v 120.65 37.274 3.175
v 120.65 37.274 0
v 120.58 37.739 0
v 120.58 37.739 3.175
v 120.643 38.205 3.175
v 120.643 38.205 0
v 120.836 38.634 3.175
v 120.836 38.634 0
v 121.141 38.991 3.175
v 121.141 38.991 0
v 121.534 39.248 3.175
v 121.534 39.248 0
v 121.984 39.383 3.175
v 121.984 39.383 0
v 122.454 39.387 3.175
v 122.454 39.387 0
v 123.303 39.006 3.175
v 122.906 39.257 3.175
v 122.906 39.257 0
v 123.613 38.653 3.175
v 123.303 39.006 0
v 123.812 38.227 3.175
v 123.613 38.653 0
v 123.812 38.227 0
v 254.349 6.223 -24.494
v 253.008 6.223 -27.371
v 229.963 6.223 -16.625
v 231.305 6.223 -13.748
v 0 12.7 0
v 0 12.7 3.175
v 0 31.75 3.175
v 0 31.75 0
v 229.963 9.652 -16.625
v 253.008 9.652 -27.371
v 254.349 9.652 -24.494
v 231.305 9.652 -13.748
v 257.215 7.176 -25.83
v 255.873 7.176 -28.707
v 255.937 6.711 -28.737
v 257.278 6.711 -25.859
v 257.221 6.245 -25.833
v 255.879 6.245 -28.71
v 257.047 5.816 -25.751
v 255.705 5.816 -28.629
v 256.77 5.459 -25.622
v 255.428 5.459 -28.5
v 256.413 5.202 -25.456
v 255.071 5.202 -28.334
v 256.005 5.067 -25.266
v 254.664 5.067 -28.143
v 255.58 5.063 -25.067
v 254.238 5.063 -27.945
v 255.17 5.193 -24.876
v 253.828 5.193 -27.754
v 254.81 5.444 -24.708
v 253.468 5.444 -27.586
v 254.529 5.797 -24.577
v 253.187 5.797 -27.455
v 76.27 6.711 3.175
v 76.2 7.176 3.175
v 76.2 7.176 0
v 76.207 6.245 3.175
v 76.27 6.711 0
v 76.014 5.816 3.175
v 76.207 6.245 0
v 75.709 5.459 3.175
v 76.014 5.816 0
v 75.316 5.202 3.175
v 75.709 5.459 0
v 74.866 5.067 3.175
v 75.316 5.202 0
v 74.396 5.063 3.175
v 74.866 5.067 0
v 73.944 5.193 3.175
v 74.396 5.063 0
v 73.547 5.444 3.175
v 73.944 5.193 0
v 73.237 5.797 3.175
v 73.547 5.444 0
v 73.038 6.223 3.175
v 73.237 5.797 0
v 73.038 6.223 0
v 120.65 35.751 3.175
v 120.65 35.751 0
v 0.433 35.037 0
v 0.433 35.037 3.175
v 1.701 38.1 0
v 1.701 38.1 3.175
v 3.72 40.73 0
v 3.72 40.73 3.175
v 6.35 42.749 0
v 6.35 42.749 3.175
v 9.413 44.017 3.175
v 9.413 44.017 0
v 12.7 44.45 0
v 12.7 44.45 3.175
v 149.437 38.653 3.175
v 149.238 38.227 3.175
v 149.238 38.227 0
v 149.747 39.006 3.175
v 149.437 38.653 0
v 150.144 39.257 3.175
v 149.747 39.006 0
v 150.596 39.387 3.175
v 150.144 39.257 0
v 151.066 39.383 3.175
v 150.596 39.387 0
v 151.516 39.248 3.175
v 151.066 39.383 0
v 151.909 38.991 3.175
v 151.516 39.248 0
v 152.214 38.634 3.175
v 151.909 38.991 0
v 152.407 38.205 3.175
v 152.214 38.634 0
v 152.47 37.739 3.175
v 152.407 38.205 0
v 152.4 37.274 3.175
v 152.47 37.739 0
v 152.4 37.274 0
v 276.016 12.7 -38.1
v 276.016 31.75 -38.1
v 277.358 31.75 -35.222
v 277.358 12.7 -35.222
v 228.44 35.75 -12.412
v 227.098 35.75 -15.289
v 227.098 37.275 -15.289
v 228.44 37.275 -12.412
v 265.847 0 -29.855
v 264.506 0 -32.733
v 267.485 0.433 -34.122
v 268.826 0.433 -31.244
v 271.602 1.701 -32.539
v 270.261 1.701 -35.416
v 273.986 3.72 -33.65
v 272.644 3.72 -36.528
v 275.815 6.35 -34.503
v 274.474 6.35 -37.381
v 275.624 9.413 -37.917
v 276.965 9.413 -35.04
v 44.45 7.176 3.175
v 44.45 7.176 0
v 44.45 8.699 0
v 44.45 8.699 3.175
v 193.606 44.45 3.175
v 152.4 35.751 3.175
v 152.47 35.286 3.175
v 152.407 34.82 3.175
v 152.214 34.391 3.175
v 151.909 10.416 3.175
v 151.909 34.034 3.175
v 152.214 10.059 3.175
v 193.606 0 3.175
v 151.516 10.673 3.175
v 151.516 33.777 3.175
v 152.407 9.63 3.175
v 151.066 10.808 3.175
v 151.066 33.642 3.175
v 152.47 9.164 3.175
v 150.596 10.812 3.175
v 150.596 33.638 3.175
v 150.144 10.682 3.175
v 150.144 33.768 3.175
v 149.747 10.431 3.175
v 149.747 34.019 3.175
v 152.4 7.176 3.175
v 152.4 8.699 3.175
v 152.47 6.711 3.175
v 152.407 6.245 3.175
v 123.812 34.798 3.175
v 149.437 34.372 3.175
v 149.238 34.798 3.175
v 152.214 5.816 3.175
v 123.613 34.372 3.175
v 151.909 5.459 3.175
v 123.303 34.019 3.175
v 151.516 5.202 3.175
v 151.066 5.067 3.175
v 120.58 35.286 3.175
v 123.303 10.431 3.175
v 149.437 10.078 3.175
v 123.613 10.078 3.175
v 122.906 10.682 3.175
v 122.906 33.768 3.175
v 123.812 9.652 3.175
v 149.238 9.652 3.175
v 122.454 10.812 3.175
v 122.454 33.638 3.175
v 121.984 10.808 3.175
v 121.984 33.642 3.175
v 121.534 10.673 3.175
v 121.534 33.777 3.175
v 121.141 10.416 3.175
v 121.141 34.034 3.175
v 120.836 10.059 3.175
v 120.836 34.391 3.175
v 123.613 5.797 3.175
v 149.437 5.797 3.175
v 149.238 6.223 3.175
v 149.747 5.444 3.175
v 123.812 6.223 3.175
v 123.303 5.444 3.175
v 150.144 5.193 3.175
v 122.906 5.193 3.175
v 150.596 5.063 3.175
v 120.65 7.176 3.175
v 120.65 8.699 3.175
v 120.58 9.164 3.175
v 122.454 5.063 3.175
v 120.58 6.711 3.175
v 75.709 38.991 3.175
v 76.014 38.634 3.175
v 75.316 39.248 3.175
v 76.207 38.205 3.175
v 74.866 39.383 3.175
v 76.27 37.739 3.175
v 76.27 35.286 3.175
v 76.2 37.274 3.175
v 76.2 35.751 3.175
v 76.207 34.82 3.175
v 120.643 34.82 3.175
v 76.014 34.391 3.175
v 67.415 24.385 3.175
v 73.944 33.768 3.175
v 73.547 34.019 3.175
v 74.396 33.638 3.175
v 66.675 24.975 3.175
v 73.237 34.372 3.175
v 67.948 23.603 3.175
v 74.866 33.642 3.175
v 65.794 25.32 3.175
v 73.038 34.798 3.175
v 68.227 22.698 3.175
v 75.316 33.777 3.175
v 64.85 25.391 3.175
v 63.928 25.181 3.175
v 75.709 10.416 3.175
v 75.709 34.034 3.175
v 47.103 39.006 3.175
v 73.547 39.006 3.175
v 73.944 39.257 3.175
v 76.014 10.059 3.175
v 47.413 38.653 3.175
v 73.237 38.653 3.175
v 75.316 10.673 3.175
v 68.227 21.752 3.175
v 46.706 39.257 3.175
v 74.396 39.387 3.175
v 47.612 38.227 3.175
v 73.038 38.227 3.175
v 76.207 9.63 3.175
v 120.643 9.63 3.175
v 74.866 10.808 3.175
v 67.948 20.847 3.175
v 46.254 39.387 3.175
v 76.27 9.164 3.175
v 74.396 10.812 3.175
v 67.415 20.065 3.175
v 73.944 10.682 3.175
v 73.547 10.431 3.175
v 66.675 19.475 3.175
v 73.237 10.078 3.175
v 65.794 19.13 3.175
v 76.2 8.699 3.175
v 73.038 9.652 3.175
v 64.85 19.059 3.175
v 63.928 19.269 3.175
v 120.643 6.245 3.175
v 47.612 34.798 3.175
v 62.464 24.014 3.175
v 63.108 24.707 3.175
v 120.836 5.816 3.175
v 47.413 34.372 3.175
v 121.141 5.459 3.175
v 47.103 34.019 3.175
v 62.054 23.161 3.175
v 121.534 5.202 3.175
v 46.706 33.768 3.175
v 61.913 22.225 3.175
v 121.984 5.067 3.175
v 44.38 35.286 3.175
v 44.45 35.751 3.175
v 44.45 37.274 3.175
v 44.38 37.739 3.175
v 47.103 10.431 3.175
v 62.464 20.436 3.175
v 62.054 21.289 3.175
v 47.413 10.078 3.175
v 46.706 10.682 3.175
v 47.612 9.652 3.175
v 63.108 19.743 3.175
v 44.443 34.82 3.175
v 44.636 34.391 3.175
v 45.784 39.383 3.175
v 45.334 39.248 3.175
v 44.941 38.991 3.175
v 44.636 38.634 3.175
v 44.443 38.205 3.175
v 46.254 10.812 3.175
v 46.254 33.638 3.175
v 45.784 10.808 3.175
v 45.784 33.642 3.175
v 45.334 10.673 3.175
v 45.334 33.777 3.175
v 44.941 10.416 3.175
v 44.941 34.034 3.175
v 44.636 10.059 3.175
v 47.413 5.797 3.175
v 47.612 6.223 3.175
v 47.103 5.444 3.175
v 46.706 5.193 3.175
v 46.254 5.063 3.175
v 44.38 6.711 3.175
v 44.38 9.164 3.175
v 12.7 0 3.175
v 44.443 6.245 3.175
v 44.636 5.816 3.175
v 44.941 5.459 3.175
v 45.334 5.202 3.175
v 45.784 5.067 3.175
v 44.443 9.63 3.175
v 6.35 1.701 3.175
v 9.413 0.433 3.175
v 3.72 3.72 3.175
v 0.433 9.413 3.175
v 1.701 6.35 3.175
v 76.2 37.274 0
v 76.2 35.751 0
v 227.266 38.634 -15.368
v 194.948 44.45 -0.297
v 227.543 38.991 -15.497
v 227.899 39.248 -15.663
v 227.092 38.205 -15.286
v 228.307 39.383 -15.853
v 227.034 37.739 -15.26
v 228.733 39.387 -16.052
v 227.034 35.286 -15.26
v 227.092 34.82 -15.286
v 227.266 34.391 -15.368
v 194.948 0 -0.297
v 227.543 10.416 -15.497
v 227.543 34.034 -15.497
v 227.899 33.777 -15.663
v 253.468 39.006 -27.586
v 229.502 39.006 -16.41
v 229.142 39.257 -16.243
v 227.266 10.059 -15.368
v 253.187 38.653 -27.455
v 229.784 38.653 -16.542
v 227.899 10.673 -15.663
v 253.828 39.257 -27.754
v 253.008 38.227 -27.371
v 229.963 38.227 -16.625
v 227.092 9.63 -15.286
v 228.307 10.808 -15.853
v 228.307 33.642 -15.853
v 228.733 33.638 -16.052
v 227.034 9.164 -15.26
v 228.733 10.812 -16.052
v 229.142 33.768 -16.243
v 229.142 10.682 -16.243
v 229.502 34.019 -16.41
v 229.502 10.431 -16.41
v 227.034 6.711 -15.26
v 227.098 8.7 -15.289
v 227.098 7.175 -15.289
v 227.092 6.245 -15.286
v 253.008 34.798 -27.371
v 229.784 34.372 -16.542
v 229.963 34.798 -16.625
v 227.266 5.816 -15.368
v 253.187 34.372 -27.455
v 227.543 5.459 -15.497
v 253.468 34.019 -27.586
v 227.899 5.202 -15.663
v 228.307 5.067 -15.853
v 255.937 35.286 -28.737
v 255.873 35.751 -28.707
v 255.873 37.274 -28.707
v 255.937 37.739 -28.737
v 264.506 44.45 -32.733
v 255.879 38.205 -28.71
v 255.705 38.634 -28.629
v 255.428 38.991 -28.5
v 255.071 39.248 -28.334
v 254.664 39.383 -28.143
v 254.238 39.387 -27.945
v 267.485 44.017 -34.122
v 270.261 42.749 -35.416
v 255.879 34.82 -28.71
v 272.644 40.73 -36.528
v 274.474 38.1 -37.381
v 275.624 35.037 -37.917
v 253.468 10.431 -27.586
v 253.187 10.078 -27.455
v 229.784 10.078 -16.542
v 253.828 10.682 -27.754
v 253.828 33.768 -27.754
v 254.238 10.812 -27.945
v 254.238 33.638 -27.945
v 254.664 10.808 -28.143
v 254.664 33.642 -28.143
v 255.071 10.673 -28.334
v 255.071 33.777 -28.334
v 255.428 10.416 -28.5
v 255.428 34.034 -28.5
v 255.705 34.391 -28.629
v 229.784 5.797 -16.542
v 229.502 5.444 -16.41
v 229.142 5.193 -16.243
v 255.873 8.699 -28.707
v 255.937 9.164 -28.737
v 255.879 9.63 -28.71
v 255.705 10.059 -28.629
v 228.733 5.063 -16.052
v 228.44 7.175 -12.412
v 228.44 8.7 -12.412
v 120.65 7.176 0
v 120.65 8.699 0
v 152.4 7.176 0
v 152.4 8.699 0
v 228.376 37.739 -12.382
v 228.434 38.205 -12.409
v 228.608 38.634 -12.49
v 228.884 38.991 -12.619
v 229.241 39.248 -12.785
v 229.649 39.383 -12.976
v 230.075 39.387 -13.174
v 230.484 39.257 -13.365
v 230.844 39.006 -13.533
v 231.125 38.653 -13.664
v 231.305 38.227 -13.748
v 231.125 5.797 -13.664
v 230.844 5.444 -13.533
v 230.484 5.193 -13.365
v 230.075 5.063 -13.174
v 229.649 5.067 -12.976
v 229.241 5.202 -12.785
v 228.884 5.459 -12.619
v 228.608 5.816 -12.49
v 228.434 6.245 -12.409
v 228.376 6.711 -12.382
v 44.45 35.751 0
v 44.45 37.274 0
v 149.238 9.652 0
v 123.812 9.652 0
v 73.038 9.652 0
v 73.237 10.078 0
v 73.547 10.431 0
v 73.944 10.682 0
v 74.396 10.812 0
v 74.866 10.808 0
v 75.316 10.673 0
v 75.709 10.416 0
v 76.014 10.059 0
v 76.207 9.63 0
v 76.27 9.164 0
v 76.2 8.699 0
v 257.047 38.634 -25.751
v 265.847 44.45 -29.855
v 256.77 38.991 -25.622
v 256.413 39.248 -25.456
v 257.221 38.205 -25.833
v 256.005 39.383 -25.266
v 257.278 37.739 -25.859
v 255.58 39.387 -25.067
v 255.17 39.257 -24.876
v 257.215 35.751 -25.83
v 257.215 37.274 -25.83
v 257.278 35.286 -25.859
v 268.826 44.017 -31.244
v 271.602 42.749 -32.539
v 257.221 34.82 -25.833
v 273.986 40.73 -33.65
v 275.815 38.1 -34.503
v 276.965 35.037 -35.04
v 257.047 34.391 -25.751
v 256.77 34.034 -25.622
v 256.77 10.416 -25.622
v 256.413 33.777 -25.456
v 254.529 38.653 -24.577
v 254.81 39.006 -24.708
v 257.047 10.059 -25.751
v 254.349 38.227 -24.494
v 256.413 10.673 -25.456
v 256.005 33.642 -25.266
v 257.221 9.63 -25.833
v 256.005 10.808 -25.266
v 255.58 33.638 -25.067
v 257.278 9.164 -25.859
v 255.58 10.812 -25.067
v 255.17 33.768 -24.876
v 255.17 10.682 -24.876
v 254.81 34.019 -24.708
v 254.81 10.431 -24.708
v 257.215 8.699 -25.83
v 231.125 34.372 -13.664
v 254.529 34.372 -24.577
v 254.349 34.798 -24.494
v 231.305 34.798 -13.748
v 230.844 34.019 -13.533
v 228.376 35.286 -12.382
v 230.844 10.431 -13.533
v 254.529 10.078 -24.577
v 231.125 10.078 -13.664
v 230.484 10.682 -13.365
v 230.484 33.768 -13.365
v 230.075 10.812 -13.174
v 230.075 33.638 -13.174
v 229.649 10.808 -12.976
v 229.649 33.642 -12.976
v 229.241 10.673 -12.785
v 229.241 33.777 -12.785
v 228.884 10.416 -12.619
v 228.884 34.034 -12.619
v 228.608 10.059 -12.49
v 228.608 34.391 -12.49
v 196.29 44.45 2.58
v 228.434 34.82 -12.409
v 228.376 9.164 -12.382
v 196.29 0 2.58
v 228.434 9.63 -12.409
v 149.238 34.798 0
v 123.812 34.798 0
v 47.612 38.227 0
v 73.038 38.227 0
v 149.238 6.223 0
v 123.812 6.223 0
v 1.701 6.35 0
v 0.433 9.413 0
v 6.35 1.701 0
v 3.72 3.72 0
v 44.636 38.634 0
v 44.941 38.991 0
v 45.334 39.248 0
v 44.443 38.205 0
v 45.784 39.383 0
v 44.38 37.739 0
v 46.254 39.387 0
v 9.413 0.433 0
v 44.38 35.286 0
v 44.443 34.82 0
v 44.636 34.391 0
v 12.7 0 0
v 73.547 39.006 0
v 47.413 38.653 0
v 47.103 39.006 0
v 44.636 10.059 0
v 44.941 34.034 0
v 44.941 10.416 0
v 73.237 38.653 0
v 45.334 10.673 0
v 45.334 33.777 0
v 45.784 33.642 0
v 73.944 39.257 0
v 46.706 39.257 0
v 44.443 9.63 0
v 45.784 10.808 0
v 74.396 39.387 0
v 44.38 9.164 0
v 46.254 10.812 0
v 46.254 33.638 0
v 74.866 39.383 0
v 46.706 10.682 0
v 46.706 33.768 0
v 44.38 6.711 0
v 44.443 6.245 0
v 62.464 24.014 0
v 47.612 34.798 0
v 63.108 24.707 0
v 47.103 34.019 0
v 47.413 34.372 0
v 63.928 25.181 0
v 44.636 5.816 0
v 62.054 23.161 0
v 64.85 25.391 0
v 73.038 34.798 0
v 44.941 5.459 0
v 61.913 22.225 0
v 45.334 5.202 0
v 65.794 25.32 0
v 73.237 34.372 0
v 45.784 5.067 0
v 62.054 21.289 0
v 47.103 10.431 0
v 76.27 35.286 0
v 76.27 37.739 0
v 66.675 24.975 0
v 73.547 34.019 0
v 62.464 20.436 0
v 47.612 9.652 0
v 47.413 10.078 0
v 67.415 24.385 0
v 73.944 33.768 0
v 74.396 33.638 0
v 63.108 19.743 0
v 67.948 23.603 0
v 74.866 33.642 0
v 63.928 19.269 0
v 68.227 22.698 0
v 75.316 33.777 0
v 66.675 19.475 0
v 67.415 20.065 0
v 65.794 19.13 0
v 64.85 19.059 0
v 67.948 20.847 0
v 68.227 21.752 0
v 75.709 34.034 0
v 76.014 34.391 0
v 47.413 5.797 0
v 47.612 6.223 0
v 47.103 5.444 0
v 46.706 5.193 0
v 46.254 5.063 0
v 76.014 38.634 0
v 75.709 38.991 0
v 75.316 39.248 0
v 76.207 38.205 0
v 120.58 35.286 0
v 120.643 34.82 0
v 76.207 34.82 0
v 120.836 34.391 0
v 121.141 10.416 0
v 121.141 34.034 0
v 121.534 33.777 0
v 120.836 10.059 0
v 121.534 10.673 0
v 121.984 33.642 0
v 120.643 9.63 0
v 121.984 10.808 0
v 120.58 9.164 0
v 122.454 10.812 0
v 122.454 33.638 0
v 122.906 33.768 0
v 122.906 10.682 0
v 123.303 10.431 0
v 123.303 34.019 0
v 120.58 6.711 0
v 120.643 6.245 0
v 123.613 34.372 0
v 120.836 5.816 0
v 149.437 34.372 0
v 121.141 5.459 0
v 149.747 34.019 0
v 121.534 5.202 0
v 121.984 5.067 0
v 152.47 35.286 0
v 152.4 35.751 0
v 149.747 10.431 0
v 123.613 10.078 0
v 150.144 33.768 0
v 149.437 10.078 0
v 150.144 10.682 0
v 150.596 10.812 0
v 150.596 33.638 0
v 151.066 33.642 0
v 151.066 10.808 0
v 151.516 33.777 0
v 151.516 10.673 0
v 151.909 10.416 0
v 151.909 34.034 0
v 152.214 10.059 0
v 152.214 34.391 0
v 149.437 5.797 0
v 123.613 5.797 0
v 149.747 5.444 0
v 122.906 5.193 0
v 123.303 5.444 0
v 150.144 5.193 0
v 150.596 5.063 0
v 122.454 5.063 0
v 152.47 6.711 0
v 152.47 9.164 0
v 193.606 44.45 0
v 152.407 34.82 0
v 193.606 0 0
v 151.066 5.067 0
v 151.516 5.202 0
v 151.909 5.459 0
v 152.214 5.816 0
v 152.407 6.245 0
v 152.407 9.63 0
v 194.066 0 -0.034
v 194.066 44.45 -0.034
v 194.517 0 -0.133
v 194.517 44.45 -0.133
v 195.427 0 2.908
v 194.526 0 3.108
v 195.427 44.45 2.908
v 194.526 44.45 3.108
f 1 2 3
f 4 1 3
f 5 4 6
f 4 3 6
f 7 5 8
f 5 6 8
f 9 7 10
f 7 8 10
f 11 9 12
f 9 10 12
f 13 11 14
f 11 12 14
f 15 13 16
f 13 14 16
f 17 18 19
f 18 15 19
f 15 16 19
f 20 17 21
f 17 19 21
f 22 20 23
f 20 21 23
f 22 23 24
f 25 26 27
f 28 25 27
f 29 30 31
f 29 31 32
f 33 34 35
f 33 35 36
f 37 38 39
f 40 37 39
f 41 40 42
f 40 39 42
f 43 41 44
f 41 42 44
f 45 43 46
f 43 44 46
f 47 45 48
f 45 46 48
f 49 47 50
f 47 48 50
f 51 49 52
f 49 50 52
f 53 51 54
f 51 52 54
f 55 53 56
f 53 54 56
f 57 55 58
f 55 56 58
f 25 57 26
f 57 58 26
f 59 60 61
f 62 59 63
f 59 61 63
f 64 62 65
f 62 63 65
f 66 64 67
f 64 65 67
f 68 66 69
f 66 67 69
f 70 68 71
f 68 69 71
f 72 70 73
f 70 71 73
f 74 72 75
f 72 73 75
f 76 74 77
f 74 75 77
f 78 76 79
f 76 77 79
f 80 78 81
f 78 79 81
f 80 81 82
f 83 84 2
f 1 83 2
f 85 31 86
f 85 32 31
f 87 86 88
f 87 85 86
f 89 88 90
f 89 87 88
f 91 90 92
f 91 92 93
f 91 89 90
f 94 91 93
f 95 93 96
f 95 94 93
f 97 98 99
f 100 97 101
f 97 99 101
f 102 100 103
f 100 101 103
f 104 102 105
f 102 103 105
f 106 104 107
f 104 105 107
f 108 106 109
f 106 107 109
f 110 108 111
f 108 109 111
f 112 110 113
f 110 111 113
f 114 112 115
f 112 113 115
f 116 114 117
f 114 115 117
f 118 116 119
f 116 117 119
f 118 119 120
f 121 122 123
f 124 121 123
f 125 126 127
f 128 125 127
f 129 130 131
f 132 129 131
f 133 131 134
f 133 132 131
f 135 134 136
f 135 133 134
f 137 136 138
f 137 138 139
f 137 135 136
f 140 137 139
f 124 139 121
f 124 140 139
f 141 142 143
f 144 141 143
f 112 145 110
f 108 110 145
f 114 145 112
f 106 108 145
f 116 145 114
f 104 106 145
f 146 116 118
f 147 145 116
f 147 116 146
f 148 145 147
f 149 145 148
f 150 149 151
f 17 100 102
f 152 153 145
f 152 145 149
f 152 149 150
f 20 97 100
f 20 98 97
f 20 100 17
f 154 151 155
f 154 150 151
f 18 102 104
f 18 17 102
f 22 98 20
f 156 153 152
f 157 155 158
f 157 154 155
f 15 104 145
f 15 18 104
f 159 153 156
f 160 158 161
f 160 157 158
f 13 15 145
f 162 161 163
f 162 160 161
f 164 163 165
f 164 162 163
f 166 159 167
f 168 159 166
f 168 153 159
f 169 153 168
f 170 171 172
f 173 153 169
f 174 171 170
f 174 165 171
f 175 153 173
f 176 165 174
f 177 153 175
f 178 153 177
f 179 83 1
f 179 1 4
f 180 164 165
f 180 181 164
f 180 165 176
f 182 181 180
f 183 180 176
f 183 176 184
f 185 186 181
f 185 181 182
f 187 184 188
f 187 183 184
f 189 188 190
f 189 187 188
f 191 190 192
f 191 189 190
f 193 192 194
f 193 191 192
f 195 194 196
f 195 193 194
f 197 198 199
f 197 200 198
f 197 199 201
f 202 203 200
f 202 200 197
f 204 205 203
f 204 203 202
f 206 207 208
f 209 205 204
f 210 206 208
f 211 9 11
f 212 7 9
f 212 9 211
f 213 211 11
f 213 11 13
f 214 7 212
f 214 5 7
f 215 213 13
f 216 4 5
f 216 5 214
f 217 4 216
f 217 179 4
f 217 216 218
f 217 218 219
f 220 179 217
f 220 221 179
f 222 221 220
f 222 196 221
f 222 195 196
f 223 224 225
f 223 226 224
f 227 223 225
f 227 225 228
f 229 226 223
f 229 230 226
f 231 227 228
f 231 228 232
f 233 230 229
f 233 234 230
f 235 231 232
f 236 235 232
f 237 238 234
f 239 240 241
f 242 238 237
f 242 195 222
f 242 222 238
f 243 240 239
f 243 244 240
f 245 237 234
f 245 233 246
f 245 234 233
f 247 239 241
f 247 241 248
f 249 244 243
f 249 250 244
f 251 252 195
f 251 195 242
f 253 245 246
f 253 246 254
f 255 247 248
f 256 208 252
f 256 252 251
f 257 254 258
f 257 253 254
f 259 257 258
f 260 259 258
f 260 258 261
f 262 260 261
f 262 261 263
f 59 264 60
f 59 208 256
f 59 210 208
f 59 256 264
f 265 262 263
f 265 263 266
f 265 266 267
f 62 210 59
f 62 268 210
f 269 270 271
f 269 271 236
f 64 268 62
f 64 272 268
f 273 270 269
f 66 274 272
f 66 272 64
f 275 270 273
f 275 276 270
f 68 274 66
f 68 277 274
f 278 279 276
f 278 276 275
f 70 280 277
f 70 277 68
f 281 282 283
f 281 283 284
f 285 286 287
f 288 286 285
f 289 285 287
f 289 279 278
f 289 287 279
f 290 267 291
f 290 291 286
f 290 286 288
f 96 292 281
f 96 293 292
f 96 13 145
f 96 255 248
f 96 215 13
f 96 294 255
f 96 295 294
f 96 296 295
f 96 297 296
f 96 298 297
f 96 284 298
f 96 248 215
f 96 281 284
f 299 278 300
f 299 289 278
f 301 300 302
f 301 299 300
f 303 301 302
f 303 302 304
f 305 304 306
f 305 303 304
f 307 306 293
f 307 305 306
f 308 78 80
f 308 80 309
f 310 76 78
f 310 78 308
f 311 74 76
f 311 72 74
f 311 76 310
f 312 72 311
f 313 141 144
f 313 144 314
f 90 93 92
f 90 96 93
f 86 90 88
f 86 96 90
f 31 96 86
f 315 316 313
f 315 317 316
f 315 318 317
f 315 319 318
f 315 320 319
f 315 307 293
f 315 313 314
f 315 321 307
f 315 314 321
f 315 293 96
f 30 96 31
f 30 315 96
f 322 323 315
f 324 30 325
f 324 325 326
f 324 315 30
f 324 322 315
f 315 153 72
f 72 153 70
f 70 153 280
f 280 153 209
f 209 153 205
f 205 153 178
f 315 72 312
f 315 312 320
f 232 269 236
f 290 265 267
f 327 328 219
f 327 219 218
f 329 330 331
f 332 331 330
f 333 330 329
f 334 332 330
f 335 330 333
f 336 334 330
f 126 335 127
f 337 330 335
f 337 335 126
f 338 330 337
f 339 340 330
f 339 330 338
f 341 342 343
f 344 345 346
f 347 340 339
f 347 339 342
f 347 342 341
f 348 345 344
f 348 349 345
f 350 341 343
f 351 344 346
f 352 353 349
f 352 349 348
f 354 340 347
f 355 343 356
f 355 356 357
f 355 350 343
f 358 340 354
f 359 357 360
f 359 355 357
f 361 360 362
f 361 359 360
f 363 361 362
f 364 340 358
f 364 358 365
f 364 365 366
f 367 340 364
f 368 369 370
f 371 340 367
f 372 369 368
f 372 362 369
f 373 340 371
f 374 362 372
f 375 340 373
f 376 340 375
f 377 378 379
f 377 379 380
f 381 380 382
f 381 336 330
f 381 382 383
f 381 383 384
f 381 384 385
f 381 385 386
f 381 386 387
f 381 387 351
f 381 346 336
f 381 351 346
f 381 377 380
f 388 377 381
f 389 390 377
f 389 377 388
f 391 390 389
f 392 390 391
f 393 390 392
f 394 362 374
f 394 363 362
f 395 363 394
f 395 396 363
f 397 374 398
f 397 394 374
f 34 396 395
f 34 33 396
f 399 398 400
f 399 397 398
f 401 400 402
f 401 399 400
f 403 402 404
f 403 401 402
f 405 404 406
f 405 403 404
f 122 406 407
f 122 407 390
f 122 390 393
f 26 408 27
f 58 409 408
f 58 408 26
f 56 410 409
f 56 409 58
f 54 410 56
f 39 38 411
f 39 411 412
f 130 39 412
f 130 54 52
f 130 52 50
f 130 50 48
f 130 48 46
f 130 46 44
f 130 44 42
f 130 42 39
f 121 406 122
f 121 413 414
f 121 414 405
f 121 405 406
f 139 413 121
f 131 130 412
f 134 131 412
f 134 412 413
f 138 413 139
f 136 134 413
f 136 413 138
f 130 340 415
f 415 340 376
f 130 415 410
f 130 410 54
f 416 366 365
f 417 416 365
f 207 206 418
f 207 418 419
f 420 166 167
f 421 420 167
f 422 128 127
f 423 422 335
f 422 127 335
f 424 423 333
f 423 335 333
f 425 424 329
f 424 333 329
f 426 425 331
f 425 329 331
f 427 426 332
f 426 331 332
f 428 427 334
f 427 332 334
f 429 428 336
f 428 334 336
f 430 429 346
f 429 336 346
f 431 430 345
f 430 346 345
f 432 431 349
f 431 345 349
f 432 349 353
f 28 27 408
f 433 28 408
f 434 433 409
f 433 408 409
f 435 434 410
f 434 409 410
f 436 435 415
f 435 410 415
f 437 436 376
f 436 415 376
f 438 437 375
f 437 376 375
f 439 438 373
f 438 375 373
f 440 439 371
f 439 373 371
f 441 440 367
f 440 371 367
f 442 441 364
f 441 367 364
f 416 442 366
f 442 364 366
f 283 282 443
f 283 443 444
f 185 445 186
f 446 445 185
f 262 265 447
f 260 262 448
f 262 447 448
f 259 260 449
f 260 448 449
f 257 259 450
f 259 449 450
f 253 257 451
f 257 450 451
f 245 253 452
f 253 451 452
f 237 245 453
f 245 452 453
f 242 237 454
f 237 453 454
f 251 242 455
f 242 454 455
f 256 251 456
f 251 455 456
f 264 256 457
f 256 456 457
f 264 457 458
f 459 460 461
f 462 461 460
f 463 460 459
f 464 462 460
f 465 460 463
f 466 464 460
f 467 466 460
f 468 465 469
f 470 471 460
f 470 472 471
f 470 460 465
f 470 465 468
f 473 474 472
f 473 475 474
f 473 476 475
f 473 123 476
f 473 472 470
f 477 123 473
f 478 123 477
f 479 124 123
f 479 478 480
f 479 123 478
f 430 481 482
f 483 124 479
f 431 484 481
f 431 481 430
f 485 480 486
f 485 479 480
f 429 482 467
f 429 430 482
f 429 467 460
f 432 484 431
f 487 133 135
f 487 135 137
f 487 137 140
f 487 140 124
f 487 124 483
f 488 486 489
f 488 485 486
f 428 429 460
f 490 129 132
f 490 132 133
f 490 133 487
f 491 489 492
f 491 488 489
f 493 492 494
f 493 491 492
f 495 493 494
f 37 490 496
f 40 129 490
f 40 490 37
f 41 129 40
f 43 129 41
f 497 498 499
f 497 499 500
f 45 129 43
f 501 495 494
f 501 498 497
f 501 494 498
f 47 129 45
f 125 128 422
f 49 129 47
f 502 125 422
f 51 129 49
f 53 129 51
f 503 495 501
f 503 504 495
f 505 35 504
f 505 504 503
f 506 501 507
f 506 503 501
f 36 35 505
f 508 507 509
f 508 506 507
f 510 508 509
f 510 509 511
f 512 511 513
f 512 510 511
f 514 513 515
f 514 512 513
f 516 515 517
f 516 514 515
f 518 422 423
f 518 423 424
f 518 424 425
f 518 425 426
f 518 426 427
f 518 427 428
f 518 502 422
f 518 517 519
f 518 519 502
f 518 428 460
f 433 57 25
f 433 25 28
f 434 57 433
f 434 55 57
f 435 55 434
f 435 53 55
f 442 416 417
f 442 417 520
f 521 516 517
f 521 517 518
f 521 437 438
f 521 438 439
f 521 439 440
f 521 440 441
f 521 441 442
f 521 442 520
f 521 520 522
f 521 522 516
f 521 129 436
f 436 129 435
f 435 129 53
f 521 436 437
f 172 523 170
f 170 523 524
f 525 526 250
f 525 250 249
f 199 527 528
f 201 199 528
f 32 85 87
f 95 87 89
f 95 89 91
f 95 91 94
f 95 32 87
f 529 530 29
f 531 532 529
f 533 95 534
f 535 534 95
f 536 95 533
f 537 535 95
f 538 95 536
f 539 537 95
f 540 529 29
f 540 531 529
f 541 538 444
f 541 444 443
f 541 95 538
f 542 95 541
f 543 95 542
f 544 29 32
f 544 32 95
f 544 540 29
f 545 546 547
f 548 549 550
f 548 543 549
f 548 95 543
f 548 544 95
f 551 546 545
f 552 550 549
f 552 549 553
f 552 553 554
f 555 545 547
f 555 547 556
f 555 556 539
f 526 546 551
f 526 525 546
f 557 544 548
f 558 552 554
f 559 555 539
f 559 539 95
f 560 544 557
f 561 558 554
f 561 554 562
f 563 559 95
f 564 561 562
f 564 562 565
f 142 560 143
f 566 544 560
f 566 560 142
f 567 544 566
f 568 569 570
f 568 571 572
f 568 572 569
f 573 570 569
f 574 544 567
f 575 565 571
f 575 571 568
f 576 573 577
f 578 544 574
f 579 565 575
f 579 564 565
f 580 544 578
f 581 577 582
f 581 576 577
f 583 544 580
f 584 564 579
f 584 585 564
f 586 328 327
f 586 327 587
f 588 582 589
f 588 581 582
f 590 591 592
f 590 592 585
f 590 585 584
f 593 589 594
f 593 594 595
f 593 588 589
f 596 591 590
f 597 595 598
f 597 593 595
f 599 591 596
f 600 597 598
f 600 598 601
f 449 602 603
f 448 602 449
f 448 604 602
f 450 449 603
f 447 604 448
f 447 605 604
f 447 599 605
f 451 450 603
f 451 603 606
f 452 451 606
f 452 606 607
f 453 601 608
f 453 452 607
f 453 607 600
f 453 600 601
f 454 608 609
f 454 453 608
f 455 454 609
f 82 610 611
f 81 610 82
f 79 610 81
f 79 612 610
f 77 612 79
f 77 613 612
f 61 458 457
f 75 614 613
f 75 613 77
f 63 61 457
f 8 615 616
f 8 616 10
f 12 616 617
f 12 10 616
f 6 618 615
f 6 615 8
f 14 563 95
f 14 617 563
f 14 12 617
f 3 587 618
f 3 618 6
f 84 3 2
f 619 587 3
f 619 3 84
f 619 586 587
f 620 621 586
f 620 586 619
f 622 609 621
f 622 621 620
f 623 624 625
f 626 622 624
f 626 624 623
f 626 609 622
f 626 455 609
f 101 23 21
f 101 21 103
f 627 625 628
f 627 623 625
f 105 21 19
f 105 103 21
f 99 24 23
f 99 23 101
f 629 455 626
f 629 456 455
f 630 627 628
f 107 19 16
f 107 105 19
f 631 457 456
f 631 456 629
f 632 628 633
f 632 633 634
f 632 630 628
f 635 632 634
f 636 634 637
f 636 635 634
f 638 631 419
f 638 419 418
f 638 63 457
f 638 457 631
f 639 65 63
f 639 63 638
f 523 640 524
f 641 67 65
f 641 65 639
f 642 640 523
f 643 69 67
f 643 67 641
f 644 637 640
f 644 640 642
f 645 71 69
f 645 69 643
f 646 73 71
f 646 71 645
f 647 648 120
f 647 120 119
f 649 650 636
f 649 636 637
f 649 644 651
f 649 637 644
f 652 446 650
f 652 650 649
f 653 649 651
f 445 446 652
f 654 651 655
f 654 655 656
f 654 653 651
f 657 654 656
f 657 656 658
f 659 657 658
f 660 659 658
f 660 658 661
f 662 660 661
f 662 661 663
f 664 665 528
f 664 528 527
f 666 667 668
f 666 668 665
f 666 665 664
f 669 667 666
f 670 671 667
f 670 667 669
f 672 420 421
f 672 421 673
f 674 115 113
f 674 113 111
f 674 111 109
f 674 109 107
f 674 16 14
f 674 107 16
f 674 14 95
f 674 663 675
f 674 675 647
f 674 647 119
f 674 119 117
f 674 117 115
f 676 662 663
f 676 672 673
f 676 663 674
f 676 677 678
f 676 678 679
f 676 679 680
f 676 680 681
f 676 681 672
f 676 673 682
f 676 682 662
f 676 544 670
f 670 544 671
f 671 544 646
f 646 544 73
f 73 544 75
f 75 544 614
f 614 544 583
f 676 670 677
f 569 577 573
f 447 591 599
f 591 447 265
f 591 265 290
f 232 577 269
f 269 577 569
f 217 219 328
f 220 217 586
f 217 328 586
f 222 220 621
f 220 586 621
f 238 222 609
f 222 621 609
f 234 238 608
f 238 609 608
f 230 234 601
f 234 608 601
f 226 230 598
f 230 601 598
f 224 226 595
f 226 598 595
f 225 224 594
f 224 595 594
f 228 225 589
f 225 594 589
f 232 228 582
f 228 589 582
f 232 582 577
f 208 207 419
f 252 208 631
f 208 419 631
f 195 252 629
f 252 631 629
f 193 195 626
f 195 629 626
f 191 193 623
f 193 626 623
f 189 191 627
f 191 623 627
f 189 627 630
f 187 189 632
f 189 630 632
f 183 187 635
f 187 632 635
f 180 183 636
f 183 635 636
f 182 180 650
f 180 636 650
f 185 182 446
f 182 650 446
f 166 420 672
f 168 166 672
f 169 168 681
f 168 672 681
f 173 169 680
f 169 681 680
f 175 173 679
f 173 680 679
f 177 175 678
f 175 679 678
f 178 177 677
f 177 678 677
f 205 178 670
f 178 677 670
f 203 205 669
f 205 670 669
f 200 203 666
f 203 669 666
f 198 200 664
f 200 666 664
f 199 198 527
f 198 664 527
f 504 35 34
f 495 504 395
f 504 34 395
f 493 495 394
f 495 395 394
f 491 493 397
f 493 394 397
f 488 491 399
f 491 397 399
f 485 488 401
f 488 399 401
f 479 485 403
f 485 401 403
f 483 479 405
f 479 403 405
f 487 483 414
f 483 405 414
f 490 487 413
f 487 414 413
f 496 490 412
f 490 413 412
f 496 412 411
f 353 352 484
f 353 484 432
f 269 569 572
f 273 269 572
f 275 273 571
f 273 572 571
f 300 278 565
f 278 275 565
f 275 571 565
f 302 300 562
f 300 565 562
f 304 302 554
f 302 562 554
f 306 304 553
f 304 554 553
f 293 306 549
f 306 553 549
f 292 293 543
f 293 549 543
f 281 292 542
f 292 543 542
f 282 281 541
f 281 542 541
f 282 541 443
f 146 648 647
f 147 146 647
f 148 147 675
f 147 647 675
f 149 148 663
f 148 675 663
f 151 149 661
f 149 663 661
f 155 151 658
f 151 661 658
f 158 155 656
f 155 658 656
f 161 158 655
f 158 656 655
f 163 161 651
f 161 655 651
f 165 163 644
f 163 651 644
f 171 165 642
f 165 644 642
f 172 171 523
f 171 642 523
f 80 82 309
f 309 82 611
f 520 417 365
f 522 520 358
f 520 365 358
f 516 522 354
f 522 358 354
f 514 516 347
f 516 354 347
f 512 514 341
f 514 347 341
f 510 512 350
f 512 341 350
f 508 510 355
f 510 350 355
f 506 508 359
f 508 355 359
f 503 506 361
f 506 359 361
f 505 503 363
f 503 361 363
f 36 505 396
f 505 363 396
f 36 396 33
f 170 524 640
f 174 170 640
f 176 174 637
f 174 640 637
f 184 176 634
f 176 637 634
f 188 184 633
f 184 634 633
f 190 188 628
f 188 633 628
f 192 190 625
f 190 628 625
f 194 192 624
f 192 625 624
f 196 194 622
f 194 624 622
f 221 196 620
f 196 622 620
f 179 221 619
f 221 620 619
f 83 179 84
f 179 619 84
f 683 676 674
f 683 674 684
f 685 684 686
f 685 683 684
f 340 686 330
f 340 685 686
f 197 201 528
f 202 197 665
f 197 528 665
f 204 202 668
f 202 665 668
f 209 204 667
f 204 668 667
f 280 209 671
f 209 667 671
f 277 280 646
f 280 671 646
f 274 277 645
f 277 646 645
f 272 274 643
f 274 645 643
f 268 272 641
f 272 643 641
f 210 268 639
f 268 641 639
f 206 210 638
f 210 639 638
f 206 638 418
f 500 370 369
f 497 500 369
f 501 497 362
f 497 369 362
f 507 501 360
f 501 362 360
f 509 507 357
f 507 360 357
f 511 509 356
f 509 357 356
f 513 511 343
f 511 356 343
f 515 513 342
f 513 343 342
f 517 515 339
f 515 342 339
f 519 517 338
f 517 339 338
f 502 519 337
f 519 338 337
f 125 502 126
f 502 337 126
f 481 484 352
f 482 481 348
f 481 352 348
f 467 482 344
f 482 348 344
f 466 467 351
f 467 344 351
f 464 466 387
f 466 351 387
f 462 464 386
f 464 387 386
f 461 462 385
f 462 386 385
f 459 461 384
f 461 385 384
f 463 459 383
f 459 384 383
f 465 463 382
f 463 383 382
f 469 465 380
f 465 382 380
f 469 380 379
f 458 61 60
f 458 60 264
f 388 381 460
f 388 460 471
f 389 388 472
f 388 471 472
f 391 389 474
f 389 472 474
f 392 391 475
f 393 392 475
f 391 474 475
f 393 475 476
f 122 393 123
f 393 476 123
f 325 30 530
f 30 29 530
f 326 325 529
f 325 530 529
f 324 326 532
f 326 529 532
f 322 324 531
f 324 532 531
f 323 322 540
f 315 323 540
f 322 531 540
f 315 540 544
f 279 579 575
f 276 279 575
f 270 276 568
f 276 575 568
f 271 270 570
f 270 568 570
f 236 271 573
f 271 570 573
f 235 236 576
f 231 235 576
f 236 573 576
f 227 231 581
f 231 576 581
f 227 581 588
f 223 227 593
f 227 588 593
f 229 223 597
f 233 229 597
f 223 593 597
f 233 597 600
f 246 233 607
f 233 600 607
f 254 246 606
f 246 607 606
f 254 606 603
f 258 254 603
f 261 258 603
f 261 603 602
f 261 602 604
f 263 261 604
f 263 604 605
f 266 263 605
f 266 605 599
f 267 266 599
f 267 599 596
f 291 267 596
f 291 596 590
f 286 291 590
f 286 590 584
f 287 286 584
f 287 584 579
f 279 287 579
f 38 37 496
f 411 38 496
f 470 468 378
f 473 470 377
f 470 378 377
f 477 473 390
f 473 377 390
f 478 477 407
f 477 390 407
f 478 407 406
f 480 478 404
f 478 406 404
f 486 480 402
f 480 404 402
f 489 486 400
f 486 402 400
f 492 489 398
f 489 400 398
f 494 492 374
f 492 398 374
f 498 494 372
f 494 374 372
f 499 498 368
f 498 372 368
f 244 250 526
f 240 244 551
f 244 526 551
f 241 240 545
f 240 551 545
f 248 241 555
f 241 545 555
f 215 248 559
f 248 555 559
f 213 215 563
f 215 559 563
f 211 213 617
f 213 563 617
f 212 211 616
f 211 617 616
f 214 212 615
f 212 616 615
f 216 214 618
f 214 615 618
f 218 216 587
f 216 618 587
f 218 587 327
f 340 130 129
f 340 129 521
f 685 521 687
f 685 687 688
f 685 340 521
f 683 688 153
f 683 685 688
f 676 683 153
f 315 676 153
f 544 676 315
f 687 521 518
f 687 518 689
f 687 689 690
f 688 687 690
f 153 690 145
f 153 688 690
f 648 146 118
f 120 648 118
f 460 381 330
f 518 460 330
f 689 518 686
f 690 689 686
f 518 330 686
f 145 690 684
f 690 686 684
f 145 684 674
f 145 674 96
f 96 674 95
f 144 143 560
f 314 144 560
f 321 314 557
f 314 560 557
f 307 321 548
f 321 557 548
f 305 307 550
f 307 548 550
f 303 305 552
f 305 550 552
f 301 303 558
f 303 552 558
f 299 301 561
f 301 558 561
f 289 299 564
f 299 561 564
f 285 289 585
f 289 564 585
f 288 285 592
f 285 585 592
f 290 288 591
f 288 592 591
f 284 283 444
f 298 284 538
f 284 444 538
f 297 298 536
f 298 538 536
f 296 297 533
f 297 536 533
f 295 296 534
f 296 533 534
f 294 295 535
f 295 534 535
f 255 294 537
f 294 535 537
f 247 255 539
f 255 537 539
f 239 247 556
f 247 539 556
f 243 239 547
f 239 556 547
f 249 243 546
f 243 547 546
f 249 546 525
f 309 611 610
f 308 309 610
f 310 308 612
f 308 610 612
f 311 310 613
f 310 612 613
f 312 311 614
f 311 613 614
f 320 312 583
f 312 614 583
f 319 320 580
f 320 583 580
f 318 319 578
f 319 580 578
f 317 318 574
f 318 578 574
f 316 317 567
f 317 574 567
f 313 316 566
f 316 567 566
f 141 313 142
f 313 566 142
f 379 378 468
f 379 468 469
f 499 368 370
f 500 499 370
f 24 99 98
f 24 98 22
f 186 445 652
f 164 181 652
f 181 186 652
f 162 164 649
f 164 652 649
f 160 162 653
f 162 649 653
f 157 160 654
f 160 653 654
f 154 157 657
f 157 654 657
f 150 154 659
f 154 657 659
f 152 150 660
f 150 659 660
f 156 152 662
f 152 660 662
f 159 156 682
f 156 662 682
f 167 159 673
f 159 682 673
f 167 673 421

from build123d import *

# Parameters (mm, degrees)
BASE_FLANGE1_DEPTH = 44.45
SKETCH6_W          = 31.75
SKETCH6_H          = 3.429
CUT_EXTRUDE1_DEPTH = 284.468887342
SKETCH7_W          = 31.75
SKETCH7_H          = 3.429
CUT_EXTRUDE2_DEPTH = 272.141941158
FILLET1_R          = 12.7
CUT_EXTRUDE3_DEPTH = 284.468887342
CUT_EXTRUDE4_DEPTH = 272.141941158
SKETCH10_R         = 3.175
CUT_EXTRUDE5_DEPTH = 284.468887342


# Sheet-metal steps are written as plain solids
with BuildPart() as part:
    # Sketch1 → Base-Flange1 (new body)
    with BuildSketch(Plane(origin=(0, 0, 0), x_dir=(1, 0, 0), z_dir=(0, 1, 0))):
        with BuildLine():
            Line((0, 0), (193.606119446, 0))
            ThreePointArc((193.606119446, 0), (194.29331522, 0.075260177), (194.947932427, 0.297472776))
            Line((194.947932427, 0.297472776), (276.015713671, 38.1))
            Line((276.015713671, 38.1), (277.357526652, 35.222472776))
            Line((277.357526652, 35.222472776), (196.289745408, -2.580054448))
            ThreePointArc((196.289745408, -2.580054448), (194.980510995, -3.024479645), (193.606119446, -3.175))
            Line((193.606119446, -3.175), (0, -3.175))
            Line((0, -3.175), (0, 0))
        make_face()
    extrude(amount=BASE_FLANGE1_DEPTH)

    # Sketch6 → Cut-Extrude1 (cut, through all)
    with BuildSketch(Plane(origin=(0, 0, 0), x_dir=(-1, 0, 0), z_dir=(0, 0, -1))):
        with Locations((-136.525, 7.9375)):
            Rectangle(SKETCH6_W, SKETCH6_H)
        with Locations((-60.325, 36.5125)):
            Rectangle(SKETCH6_W, SKETCH6_H)
        with Locations((-136.525, 36.5125)):
            Rectangle(SKETCH6_W, SKETCH6_H)
        with Locations((-60.325, 7.9375)):
            Rectangle(SKETCH6_W, SKETCH6_H)
    extrude(amount=-CUT_EXTRUDE1_DEPTH, mode=Mode.SUBTRACT)

    # Sketch7 → Cut-Extrude2 (cut, through all)
    with BuildSketch(Plane(origin=(34.704969781, 0, 74.425047871), x_dir=(-0.9063077870366493, 0, 0.42261826174070083), z_dir=(-0.4226182617407009, 0, -0.9063077870366494))):
        with Locations((-228.156946417, 36.5125)):
            Rectangle(SKETCH7_W, SKETCH7_H)
        with Locations((-228.156946417, 7.9375)):
            Rectangle(SKETCH7_W, SKETCH7_H)
    extrude(amount=-CUT_EXTRUDE2_DEPTH, mode=Mode.SUBTRACT)

    # Fillet1
    fillet1_edges = [part.edges().sort_by_distance(p)[0] for p in [
        (0, 44.45, 1.5875),
        (0, 0, 1.5875),
        (276.686620162, 44.45, -36.661236388),
        (276.686620162, 0, -36.661236388),
    ]]
    fillet(fillet1_edges, radius=FILLET1_R)

    # Sketch8 → Cut-Extrude3 (cut, through all)
    with BuildSketch(Plane(origin=(0, 0, 0), x_dir=(-1, 0, 0), z_dir=(0, 0, -1))):
        with BuildLine():
            ThreePointArc((-44.938784585, 36.5125), (-46.030818439, 39.40175), (-47.122852293, 36.5125))
            ThreePointArc((-47.122852293, 36.5125), (-46.030818439, 33.62325), (-44.938784585, 36.5125))
        make_face()
        with BuildLine():
            ThreePointArc((-75.711215415, 36.5125), (-74.619181561, 33.62325), (-73.527147707, 36.5125))
            ThreePointArc((-73.527147707, 36.5125), (-74.619181561, 39.40175), (-75.711215415, 36.5125))
        make_face()
        with BuildLine():
            ThreePointArc((-121.138784585, 36.5125), (-122.230818439, 39.40175), (-123.322852293, 36.5125))
            ThreePointArc((-123.322852293, 36.5125), (-122.230818439, 33.62325), (-121.138784585, 36.5125))
        make_face()
        with BuildLine():
            ThreePointArc((-151.911215415, 36.5125), (-150.819181561, 33.62325), (-149.727147707, 36.5125))
            ThreePointArc((-149.727147707, 36.5125), (-150.819181561, 39.40175), (-151.911215415, 36.5125))
        make_face()
        with BuildLine():
            ThreePointArc((-151.911215415, 7.9375), (-150.819181561, 5.04825), (-149.727147707, 7.9375))
            ThreePointArc((-149.727147707, 7.9375), (-150.819181561, 10.82675), (-151.911215415, 7.9375))
        make_face()
        with BuildLine():
            ThreePointArc((-121.138784585, 7.9375), (-122.230818439, 10.82675), (-123.322852293, 7.9375))
            ThreePointArc((-123.322852293, 7.9375), (-122.230818439, 5.04825), (-121.138784585, 7.9375))
        make_face()
        with BuildLine():
            ThreePointArc((-75.711215415, 7.9375), (-74.619181561, 5.04825), (-73.527147707, 7.9375))
            ThreePointArc((-73.527147707, 7.9375), (-74.619181561, 10.82675), (-75.711215415, 7.9375))
        make_face()
        with BuildLine():
            ThreePointArc((-44.938784585, 7.9375), (-46.030818439, 10.82675), (-47.122852293, 7.9375))
            ThreePointArc((-47.122852293, 7.9375), (-46.030818439, 5.04825), (-44.938784585, 7.9375))
        make_face()
    extrude(amount=-CUT_EXTRUDE3_DEPTH, mode=Mode.SUBTRACT)

    # Sketch9 → Cut-Extrude4 (cut, through all)
    with BuildSketch(Plane(origin=(34.704969781, 0, 74.425047871), x_dir=(-0.9063077870366492, 0, 0.42261826174070116), z_dir=(-0.42261826174070116, 0, -0.9063077870366492))):
        with BuildLine():
            ThreePointArc((-214.95479871, 36.5125), (-213.862764856, 33.62325), (-212.770731003, 36.5125))
            ThreePointArc((-212.770731003, 36.5125), (-213.862764856, 39.40175), (-214.95479871, 36.5125))
        make_face()
        with BuildLine():
            ThreePointArc((-241.359094124, 36.5125), (-242.451127978, 39.40175), (-243.543161832, 36.5125))
            ThreePointArc((-243.543161832, 36.5125), (-242.451127978, 33.62325), (-241.359094124, 36.5125))
        make_face()
        with BuildLine():
            ThreePointArc((-241.359094124, 7.9375), (-242.451127978, 10.82675), (-243.543161832, 7.9375))
            ThreePointArc((-243.543161832, 7.9375), (-242.451127978, 5.04825), (-241.359094124, 7.9375))
        make_face()
        with BuildLine():
            ThreePointArc((-214.95479871, 7.9375), (-213.862764856, 5.04825), (-212.770731003, 7.9375))
            ThreePointArc((-212.770731003, 7.9375), (-213.862764856, 10.82675), (-214.95479871, 7.9375))
        make_face()
    extrude(amount=-CUT_EXTRUDE4_DEPTH, mode=Mode.SUBTRACT)

    # Sketch10 → Cut-Extrude5 (cut, through all)
    with BuildSketch(Plane(origin=(0, 0, 0), x_dir=(-1, 0, 0), z_dir=(0, 0, -1))):
        with Locations((-65.0875, 22.225)):
            Circle(SKETCH10_R)
    extrude(amount=-CUT_EXTRUDE5_DEPTH, mode=Mode.SUBTRACT)


solid = part.part
